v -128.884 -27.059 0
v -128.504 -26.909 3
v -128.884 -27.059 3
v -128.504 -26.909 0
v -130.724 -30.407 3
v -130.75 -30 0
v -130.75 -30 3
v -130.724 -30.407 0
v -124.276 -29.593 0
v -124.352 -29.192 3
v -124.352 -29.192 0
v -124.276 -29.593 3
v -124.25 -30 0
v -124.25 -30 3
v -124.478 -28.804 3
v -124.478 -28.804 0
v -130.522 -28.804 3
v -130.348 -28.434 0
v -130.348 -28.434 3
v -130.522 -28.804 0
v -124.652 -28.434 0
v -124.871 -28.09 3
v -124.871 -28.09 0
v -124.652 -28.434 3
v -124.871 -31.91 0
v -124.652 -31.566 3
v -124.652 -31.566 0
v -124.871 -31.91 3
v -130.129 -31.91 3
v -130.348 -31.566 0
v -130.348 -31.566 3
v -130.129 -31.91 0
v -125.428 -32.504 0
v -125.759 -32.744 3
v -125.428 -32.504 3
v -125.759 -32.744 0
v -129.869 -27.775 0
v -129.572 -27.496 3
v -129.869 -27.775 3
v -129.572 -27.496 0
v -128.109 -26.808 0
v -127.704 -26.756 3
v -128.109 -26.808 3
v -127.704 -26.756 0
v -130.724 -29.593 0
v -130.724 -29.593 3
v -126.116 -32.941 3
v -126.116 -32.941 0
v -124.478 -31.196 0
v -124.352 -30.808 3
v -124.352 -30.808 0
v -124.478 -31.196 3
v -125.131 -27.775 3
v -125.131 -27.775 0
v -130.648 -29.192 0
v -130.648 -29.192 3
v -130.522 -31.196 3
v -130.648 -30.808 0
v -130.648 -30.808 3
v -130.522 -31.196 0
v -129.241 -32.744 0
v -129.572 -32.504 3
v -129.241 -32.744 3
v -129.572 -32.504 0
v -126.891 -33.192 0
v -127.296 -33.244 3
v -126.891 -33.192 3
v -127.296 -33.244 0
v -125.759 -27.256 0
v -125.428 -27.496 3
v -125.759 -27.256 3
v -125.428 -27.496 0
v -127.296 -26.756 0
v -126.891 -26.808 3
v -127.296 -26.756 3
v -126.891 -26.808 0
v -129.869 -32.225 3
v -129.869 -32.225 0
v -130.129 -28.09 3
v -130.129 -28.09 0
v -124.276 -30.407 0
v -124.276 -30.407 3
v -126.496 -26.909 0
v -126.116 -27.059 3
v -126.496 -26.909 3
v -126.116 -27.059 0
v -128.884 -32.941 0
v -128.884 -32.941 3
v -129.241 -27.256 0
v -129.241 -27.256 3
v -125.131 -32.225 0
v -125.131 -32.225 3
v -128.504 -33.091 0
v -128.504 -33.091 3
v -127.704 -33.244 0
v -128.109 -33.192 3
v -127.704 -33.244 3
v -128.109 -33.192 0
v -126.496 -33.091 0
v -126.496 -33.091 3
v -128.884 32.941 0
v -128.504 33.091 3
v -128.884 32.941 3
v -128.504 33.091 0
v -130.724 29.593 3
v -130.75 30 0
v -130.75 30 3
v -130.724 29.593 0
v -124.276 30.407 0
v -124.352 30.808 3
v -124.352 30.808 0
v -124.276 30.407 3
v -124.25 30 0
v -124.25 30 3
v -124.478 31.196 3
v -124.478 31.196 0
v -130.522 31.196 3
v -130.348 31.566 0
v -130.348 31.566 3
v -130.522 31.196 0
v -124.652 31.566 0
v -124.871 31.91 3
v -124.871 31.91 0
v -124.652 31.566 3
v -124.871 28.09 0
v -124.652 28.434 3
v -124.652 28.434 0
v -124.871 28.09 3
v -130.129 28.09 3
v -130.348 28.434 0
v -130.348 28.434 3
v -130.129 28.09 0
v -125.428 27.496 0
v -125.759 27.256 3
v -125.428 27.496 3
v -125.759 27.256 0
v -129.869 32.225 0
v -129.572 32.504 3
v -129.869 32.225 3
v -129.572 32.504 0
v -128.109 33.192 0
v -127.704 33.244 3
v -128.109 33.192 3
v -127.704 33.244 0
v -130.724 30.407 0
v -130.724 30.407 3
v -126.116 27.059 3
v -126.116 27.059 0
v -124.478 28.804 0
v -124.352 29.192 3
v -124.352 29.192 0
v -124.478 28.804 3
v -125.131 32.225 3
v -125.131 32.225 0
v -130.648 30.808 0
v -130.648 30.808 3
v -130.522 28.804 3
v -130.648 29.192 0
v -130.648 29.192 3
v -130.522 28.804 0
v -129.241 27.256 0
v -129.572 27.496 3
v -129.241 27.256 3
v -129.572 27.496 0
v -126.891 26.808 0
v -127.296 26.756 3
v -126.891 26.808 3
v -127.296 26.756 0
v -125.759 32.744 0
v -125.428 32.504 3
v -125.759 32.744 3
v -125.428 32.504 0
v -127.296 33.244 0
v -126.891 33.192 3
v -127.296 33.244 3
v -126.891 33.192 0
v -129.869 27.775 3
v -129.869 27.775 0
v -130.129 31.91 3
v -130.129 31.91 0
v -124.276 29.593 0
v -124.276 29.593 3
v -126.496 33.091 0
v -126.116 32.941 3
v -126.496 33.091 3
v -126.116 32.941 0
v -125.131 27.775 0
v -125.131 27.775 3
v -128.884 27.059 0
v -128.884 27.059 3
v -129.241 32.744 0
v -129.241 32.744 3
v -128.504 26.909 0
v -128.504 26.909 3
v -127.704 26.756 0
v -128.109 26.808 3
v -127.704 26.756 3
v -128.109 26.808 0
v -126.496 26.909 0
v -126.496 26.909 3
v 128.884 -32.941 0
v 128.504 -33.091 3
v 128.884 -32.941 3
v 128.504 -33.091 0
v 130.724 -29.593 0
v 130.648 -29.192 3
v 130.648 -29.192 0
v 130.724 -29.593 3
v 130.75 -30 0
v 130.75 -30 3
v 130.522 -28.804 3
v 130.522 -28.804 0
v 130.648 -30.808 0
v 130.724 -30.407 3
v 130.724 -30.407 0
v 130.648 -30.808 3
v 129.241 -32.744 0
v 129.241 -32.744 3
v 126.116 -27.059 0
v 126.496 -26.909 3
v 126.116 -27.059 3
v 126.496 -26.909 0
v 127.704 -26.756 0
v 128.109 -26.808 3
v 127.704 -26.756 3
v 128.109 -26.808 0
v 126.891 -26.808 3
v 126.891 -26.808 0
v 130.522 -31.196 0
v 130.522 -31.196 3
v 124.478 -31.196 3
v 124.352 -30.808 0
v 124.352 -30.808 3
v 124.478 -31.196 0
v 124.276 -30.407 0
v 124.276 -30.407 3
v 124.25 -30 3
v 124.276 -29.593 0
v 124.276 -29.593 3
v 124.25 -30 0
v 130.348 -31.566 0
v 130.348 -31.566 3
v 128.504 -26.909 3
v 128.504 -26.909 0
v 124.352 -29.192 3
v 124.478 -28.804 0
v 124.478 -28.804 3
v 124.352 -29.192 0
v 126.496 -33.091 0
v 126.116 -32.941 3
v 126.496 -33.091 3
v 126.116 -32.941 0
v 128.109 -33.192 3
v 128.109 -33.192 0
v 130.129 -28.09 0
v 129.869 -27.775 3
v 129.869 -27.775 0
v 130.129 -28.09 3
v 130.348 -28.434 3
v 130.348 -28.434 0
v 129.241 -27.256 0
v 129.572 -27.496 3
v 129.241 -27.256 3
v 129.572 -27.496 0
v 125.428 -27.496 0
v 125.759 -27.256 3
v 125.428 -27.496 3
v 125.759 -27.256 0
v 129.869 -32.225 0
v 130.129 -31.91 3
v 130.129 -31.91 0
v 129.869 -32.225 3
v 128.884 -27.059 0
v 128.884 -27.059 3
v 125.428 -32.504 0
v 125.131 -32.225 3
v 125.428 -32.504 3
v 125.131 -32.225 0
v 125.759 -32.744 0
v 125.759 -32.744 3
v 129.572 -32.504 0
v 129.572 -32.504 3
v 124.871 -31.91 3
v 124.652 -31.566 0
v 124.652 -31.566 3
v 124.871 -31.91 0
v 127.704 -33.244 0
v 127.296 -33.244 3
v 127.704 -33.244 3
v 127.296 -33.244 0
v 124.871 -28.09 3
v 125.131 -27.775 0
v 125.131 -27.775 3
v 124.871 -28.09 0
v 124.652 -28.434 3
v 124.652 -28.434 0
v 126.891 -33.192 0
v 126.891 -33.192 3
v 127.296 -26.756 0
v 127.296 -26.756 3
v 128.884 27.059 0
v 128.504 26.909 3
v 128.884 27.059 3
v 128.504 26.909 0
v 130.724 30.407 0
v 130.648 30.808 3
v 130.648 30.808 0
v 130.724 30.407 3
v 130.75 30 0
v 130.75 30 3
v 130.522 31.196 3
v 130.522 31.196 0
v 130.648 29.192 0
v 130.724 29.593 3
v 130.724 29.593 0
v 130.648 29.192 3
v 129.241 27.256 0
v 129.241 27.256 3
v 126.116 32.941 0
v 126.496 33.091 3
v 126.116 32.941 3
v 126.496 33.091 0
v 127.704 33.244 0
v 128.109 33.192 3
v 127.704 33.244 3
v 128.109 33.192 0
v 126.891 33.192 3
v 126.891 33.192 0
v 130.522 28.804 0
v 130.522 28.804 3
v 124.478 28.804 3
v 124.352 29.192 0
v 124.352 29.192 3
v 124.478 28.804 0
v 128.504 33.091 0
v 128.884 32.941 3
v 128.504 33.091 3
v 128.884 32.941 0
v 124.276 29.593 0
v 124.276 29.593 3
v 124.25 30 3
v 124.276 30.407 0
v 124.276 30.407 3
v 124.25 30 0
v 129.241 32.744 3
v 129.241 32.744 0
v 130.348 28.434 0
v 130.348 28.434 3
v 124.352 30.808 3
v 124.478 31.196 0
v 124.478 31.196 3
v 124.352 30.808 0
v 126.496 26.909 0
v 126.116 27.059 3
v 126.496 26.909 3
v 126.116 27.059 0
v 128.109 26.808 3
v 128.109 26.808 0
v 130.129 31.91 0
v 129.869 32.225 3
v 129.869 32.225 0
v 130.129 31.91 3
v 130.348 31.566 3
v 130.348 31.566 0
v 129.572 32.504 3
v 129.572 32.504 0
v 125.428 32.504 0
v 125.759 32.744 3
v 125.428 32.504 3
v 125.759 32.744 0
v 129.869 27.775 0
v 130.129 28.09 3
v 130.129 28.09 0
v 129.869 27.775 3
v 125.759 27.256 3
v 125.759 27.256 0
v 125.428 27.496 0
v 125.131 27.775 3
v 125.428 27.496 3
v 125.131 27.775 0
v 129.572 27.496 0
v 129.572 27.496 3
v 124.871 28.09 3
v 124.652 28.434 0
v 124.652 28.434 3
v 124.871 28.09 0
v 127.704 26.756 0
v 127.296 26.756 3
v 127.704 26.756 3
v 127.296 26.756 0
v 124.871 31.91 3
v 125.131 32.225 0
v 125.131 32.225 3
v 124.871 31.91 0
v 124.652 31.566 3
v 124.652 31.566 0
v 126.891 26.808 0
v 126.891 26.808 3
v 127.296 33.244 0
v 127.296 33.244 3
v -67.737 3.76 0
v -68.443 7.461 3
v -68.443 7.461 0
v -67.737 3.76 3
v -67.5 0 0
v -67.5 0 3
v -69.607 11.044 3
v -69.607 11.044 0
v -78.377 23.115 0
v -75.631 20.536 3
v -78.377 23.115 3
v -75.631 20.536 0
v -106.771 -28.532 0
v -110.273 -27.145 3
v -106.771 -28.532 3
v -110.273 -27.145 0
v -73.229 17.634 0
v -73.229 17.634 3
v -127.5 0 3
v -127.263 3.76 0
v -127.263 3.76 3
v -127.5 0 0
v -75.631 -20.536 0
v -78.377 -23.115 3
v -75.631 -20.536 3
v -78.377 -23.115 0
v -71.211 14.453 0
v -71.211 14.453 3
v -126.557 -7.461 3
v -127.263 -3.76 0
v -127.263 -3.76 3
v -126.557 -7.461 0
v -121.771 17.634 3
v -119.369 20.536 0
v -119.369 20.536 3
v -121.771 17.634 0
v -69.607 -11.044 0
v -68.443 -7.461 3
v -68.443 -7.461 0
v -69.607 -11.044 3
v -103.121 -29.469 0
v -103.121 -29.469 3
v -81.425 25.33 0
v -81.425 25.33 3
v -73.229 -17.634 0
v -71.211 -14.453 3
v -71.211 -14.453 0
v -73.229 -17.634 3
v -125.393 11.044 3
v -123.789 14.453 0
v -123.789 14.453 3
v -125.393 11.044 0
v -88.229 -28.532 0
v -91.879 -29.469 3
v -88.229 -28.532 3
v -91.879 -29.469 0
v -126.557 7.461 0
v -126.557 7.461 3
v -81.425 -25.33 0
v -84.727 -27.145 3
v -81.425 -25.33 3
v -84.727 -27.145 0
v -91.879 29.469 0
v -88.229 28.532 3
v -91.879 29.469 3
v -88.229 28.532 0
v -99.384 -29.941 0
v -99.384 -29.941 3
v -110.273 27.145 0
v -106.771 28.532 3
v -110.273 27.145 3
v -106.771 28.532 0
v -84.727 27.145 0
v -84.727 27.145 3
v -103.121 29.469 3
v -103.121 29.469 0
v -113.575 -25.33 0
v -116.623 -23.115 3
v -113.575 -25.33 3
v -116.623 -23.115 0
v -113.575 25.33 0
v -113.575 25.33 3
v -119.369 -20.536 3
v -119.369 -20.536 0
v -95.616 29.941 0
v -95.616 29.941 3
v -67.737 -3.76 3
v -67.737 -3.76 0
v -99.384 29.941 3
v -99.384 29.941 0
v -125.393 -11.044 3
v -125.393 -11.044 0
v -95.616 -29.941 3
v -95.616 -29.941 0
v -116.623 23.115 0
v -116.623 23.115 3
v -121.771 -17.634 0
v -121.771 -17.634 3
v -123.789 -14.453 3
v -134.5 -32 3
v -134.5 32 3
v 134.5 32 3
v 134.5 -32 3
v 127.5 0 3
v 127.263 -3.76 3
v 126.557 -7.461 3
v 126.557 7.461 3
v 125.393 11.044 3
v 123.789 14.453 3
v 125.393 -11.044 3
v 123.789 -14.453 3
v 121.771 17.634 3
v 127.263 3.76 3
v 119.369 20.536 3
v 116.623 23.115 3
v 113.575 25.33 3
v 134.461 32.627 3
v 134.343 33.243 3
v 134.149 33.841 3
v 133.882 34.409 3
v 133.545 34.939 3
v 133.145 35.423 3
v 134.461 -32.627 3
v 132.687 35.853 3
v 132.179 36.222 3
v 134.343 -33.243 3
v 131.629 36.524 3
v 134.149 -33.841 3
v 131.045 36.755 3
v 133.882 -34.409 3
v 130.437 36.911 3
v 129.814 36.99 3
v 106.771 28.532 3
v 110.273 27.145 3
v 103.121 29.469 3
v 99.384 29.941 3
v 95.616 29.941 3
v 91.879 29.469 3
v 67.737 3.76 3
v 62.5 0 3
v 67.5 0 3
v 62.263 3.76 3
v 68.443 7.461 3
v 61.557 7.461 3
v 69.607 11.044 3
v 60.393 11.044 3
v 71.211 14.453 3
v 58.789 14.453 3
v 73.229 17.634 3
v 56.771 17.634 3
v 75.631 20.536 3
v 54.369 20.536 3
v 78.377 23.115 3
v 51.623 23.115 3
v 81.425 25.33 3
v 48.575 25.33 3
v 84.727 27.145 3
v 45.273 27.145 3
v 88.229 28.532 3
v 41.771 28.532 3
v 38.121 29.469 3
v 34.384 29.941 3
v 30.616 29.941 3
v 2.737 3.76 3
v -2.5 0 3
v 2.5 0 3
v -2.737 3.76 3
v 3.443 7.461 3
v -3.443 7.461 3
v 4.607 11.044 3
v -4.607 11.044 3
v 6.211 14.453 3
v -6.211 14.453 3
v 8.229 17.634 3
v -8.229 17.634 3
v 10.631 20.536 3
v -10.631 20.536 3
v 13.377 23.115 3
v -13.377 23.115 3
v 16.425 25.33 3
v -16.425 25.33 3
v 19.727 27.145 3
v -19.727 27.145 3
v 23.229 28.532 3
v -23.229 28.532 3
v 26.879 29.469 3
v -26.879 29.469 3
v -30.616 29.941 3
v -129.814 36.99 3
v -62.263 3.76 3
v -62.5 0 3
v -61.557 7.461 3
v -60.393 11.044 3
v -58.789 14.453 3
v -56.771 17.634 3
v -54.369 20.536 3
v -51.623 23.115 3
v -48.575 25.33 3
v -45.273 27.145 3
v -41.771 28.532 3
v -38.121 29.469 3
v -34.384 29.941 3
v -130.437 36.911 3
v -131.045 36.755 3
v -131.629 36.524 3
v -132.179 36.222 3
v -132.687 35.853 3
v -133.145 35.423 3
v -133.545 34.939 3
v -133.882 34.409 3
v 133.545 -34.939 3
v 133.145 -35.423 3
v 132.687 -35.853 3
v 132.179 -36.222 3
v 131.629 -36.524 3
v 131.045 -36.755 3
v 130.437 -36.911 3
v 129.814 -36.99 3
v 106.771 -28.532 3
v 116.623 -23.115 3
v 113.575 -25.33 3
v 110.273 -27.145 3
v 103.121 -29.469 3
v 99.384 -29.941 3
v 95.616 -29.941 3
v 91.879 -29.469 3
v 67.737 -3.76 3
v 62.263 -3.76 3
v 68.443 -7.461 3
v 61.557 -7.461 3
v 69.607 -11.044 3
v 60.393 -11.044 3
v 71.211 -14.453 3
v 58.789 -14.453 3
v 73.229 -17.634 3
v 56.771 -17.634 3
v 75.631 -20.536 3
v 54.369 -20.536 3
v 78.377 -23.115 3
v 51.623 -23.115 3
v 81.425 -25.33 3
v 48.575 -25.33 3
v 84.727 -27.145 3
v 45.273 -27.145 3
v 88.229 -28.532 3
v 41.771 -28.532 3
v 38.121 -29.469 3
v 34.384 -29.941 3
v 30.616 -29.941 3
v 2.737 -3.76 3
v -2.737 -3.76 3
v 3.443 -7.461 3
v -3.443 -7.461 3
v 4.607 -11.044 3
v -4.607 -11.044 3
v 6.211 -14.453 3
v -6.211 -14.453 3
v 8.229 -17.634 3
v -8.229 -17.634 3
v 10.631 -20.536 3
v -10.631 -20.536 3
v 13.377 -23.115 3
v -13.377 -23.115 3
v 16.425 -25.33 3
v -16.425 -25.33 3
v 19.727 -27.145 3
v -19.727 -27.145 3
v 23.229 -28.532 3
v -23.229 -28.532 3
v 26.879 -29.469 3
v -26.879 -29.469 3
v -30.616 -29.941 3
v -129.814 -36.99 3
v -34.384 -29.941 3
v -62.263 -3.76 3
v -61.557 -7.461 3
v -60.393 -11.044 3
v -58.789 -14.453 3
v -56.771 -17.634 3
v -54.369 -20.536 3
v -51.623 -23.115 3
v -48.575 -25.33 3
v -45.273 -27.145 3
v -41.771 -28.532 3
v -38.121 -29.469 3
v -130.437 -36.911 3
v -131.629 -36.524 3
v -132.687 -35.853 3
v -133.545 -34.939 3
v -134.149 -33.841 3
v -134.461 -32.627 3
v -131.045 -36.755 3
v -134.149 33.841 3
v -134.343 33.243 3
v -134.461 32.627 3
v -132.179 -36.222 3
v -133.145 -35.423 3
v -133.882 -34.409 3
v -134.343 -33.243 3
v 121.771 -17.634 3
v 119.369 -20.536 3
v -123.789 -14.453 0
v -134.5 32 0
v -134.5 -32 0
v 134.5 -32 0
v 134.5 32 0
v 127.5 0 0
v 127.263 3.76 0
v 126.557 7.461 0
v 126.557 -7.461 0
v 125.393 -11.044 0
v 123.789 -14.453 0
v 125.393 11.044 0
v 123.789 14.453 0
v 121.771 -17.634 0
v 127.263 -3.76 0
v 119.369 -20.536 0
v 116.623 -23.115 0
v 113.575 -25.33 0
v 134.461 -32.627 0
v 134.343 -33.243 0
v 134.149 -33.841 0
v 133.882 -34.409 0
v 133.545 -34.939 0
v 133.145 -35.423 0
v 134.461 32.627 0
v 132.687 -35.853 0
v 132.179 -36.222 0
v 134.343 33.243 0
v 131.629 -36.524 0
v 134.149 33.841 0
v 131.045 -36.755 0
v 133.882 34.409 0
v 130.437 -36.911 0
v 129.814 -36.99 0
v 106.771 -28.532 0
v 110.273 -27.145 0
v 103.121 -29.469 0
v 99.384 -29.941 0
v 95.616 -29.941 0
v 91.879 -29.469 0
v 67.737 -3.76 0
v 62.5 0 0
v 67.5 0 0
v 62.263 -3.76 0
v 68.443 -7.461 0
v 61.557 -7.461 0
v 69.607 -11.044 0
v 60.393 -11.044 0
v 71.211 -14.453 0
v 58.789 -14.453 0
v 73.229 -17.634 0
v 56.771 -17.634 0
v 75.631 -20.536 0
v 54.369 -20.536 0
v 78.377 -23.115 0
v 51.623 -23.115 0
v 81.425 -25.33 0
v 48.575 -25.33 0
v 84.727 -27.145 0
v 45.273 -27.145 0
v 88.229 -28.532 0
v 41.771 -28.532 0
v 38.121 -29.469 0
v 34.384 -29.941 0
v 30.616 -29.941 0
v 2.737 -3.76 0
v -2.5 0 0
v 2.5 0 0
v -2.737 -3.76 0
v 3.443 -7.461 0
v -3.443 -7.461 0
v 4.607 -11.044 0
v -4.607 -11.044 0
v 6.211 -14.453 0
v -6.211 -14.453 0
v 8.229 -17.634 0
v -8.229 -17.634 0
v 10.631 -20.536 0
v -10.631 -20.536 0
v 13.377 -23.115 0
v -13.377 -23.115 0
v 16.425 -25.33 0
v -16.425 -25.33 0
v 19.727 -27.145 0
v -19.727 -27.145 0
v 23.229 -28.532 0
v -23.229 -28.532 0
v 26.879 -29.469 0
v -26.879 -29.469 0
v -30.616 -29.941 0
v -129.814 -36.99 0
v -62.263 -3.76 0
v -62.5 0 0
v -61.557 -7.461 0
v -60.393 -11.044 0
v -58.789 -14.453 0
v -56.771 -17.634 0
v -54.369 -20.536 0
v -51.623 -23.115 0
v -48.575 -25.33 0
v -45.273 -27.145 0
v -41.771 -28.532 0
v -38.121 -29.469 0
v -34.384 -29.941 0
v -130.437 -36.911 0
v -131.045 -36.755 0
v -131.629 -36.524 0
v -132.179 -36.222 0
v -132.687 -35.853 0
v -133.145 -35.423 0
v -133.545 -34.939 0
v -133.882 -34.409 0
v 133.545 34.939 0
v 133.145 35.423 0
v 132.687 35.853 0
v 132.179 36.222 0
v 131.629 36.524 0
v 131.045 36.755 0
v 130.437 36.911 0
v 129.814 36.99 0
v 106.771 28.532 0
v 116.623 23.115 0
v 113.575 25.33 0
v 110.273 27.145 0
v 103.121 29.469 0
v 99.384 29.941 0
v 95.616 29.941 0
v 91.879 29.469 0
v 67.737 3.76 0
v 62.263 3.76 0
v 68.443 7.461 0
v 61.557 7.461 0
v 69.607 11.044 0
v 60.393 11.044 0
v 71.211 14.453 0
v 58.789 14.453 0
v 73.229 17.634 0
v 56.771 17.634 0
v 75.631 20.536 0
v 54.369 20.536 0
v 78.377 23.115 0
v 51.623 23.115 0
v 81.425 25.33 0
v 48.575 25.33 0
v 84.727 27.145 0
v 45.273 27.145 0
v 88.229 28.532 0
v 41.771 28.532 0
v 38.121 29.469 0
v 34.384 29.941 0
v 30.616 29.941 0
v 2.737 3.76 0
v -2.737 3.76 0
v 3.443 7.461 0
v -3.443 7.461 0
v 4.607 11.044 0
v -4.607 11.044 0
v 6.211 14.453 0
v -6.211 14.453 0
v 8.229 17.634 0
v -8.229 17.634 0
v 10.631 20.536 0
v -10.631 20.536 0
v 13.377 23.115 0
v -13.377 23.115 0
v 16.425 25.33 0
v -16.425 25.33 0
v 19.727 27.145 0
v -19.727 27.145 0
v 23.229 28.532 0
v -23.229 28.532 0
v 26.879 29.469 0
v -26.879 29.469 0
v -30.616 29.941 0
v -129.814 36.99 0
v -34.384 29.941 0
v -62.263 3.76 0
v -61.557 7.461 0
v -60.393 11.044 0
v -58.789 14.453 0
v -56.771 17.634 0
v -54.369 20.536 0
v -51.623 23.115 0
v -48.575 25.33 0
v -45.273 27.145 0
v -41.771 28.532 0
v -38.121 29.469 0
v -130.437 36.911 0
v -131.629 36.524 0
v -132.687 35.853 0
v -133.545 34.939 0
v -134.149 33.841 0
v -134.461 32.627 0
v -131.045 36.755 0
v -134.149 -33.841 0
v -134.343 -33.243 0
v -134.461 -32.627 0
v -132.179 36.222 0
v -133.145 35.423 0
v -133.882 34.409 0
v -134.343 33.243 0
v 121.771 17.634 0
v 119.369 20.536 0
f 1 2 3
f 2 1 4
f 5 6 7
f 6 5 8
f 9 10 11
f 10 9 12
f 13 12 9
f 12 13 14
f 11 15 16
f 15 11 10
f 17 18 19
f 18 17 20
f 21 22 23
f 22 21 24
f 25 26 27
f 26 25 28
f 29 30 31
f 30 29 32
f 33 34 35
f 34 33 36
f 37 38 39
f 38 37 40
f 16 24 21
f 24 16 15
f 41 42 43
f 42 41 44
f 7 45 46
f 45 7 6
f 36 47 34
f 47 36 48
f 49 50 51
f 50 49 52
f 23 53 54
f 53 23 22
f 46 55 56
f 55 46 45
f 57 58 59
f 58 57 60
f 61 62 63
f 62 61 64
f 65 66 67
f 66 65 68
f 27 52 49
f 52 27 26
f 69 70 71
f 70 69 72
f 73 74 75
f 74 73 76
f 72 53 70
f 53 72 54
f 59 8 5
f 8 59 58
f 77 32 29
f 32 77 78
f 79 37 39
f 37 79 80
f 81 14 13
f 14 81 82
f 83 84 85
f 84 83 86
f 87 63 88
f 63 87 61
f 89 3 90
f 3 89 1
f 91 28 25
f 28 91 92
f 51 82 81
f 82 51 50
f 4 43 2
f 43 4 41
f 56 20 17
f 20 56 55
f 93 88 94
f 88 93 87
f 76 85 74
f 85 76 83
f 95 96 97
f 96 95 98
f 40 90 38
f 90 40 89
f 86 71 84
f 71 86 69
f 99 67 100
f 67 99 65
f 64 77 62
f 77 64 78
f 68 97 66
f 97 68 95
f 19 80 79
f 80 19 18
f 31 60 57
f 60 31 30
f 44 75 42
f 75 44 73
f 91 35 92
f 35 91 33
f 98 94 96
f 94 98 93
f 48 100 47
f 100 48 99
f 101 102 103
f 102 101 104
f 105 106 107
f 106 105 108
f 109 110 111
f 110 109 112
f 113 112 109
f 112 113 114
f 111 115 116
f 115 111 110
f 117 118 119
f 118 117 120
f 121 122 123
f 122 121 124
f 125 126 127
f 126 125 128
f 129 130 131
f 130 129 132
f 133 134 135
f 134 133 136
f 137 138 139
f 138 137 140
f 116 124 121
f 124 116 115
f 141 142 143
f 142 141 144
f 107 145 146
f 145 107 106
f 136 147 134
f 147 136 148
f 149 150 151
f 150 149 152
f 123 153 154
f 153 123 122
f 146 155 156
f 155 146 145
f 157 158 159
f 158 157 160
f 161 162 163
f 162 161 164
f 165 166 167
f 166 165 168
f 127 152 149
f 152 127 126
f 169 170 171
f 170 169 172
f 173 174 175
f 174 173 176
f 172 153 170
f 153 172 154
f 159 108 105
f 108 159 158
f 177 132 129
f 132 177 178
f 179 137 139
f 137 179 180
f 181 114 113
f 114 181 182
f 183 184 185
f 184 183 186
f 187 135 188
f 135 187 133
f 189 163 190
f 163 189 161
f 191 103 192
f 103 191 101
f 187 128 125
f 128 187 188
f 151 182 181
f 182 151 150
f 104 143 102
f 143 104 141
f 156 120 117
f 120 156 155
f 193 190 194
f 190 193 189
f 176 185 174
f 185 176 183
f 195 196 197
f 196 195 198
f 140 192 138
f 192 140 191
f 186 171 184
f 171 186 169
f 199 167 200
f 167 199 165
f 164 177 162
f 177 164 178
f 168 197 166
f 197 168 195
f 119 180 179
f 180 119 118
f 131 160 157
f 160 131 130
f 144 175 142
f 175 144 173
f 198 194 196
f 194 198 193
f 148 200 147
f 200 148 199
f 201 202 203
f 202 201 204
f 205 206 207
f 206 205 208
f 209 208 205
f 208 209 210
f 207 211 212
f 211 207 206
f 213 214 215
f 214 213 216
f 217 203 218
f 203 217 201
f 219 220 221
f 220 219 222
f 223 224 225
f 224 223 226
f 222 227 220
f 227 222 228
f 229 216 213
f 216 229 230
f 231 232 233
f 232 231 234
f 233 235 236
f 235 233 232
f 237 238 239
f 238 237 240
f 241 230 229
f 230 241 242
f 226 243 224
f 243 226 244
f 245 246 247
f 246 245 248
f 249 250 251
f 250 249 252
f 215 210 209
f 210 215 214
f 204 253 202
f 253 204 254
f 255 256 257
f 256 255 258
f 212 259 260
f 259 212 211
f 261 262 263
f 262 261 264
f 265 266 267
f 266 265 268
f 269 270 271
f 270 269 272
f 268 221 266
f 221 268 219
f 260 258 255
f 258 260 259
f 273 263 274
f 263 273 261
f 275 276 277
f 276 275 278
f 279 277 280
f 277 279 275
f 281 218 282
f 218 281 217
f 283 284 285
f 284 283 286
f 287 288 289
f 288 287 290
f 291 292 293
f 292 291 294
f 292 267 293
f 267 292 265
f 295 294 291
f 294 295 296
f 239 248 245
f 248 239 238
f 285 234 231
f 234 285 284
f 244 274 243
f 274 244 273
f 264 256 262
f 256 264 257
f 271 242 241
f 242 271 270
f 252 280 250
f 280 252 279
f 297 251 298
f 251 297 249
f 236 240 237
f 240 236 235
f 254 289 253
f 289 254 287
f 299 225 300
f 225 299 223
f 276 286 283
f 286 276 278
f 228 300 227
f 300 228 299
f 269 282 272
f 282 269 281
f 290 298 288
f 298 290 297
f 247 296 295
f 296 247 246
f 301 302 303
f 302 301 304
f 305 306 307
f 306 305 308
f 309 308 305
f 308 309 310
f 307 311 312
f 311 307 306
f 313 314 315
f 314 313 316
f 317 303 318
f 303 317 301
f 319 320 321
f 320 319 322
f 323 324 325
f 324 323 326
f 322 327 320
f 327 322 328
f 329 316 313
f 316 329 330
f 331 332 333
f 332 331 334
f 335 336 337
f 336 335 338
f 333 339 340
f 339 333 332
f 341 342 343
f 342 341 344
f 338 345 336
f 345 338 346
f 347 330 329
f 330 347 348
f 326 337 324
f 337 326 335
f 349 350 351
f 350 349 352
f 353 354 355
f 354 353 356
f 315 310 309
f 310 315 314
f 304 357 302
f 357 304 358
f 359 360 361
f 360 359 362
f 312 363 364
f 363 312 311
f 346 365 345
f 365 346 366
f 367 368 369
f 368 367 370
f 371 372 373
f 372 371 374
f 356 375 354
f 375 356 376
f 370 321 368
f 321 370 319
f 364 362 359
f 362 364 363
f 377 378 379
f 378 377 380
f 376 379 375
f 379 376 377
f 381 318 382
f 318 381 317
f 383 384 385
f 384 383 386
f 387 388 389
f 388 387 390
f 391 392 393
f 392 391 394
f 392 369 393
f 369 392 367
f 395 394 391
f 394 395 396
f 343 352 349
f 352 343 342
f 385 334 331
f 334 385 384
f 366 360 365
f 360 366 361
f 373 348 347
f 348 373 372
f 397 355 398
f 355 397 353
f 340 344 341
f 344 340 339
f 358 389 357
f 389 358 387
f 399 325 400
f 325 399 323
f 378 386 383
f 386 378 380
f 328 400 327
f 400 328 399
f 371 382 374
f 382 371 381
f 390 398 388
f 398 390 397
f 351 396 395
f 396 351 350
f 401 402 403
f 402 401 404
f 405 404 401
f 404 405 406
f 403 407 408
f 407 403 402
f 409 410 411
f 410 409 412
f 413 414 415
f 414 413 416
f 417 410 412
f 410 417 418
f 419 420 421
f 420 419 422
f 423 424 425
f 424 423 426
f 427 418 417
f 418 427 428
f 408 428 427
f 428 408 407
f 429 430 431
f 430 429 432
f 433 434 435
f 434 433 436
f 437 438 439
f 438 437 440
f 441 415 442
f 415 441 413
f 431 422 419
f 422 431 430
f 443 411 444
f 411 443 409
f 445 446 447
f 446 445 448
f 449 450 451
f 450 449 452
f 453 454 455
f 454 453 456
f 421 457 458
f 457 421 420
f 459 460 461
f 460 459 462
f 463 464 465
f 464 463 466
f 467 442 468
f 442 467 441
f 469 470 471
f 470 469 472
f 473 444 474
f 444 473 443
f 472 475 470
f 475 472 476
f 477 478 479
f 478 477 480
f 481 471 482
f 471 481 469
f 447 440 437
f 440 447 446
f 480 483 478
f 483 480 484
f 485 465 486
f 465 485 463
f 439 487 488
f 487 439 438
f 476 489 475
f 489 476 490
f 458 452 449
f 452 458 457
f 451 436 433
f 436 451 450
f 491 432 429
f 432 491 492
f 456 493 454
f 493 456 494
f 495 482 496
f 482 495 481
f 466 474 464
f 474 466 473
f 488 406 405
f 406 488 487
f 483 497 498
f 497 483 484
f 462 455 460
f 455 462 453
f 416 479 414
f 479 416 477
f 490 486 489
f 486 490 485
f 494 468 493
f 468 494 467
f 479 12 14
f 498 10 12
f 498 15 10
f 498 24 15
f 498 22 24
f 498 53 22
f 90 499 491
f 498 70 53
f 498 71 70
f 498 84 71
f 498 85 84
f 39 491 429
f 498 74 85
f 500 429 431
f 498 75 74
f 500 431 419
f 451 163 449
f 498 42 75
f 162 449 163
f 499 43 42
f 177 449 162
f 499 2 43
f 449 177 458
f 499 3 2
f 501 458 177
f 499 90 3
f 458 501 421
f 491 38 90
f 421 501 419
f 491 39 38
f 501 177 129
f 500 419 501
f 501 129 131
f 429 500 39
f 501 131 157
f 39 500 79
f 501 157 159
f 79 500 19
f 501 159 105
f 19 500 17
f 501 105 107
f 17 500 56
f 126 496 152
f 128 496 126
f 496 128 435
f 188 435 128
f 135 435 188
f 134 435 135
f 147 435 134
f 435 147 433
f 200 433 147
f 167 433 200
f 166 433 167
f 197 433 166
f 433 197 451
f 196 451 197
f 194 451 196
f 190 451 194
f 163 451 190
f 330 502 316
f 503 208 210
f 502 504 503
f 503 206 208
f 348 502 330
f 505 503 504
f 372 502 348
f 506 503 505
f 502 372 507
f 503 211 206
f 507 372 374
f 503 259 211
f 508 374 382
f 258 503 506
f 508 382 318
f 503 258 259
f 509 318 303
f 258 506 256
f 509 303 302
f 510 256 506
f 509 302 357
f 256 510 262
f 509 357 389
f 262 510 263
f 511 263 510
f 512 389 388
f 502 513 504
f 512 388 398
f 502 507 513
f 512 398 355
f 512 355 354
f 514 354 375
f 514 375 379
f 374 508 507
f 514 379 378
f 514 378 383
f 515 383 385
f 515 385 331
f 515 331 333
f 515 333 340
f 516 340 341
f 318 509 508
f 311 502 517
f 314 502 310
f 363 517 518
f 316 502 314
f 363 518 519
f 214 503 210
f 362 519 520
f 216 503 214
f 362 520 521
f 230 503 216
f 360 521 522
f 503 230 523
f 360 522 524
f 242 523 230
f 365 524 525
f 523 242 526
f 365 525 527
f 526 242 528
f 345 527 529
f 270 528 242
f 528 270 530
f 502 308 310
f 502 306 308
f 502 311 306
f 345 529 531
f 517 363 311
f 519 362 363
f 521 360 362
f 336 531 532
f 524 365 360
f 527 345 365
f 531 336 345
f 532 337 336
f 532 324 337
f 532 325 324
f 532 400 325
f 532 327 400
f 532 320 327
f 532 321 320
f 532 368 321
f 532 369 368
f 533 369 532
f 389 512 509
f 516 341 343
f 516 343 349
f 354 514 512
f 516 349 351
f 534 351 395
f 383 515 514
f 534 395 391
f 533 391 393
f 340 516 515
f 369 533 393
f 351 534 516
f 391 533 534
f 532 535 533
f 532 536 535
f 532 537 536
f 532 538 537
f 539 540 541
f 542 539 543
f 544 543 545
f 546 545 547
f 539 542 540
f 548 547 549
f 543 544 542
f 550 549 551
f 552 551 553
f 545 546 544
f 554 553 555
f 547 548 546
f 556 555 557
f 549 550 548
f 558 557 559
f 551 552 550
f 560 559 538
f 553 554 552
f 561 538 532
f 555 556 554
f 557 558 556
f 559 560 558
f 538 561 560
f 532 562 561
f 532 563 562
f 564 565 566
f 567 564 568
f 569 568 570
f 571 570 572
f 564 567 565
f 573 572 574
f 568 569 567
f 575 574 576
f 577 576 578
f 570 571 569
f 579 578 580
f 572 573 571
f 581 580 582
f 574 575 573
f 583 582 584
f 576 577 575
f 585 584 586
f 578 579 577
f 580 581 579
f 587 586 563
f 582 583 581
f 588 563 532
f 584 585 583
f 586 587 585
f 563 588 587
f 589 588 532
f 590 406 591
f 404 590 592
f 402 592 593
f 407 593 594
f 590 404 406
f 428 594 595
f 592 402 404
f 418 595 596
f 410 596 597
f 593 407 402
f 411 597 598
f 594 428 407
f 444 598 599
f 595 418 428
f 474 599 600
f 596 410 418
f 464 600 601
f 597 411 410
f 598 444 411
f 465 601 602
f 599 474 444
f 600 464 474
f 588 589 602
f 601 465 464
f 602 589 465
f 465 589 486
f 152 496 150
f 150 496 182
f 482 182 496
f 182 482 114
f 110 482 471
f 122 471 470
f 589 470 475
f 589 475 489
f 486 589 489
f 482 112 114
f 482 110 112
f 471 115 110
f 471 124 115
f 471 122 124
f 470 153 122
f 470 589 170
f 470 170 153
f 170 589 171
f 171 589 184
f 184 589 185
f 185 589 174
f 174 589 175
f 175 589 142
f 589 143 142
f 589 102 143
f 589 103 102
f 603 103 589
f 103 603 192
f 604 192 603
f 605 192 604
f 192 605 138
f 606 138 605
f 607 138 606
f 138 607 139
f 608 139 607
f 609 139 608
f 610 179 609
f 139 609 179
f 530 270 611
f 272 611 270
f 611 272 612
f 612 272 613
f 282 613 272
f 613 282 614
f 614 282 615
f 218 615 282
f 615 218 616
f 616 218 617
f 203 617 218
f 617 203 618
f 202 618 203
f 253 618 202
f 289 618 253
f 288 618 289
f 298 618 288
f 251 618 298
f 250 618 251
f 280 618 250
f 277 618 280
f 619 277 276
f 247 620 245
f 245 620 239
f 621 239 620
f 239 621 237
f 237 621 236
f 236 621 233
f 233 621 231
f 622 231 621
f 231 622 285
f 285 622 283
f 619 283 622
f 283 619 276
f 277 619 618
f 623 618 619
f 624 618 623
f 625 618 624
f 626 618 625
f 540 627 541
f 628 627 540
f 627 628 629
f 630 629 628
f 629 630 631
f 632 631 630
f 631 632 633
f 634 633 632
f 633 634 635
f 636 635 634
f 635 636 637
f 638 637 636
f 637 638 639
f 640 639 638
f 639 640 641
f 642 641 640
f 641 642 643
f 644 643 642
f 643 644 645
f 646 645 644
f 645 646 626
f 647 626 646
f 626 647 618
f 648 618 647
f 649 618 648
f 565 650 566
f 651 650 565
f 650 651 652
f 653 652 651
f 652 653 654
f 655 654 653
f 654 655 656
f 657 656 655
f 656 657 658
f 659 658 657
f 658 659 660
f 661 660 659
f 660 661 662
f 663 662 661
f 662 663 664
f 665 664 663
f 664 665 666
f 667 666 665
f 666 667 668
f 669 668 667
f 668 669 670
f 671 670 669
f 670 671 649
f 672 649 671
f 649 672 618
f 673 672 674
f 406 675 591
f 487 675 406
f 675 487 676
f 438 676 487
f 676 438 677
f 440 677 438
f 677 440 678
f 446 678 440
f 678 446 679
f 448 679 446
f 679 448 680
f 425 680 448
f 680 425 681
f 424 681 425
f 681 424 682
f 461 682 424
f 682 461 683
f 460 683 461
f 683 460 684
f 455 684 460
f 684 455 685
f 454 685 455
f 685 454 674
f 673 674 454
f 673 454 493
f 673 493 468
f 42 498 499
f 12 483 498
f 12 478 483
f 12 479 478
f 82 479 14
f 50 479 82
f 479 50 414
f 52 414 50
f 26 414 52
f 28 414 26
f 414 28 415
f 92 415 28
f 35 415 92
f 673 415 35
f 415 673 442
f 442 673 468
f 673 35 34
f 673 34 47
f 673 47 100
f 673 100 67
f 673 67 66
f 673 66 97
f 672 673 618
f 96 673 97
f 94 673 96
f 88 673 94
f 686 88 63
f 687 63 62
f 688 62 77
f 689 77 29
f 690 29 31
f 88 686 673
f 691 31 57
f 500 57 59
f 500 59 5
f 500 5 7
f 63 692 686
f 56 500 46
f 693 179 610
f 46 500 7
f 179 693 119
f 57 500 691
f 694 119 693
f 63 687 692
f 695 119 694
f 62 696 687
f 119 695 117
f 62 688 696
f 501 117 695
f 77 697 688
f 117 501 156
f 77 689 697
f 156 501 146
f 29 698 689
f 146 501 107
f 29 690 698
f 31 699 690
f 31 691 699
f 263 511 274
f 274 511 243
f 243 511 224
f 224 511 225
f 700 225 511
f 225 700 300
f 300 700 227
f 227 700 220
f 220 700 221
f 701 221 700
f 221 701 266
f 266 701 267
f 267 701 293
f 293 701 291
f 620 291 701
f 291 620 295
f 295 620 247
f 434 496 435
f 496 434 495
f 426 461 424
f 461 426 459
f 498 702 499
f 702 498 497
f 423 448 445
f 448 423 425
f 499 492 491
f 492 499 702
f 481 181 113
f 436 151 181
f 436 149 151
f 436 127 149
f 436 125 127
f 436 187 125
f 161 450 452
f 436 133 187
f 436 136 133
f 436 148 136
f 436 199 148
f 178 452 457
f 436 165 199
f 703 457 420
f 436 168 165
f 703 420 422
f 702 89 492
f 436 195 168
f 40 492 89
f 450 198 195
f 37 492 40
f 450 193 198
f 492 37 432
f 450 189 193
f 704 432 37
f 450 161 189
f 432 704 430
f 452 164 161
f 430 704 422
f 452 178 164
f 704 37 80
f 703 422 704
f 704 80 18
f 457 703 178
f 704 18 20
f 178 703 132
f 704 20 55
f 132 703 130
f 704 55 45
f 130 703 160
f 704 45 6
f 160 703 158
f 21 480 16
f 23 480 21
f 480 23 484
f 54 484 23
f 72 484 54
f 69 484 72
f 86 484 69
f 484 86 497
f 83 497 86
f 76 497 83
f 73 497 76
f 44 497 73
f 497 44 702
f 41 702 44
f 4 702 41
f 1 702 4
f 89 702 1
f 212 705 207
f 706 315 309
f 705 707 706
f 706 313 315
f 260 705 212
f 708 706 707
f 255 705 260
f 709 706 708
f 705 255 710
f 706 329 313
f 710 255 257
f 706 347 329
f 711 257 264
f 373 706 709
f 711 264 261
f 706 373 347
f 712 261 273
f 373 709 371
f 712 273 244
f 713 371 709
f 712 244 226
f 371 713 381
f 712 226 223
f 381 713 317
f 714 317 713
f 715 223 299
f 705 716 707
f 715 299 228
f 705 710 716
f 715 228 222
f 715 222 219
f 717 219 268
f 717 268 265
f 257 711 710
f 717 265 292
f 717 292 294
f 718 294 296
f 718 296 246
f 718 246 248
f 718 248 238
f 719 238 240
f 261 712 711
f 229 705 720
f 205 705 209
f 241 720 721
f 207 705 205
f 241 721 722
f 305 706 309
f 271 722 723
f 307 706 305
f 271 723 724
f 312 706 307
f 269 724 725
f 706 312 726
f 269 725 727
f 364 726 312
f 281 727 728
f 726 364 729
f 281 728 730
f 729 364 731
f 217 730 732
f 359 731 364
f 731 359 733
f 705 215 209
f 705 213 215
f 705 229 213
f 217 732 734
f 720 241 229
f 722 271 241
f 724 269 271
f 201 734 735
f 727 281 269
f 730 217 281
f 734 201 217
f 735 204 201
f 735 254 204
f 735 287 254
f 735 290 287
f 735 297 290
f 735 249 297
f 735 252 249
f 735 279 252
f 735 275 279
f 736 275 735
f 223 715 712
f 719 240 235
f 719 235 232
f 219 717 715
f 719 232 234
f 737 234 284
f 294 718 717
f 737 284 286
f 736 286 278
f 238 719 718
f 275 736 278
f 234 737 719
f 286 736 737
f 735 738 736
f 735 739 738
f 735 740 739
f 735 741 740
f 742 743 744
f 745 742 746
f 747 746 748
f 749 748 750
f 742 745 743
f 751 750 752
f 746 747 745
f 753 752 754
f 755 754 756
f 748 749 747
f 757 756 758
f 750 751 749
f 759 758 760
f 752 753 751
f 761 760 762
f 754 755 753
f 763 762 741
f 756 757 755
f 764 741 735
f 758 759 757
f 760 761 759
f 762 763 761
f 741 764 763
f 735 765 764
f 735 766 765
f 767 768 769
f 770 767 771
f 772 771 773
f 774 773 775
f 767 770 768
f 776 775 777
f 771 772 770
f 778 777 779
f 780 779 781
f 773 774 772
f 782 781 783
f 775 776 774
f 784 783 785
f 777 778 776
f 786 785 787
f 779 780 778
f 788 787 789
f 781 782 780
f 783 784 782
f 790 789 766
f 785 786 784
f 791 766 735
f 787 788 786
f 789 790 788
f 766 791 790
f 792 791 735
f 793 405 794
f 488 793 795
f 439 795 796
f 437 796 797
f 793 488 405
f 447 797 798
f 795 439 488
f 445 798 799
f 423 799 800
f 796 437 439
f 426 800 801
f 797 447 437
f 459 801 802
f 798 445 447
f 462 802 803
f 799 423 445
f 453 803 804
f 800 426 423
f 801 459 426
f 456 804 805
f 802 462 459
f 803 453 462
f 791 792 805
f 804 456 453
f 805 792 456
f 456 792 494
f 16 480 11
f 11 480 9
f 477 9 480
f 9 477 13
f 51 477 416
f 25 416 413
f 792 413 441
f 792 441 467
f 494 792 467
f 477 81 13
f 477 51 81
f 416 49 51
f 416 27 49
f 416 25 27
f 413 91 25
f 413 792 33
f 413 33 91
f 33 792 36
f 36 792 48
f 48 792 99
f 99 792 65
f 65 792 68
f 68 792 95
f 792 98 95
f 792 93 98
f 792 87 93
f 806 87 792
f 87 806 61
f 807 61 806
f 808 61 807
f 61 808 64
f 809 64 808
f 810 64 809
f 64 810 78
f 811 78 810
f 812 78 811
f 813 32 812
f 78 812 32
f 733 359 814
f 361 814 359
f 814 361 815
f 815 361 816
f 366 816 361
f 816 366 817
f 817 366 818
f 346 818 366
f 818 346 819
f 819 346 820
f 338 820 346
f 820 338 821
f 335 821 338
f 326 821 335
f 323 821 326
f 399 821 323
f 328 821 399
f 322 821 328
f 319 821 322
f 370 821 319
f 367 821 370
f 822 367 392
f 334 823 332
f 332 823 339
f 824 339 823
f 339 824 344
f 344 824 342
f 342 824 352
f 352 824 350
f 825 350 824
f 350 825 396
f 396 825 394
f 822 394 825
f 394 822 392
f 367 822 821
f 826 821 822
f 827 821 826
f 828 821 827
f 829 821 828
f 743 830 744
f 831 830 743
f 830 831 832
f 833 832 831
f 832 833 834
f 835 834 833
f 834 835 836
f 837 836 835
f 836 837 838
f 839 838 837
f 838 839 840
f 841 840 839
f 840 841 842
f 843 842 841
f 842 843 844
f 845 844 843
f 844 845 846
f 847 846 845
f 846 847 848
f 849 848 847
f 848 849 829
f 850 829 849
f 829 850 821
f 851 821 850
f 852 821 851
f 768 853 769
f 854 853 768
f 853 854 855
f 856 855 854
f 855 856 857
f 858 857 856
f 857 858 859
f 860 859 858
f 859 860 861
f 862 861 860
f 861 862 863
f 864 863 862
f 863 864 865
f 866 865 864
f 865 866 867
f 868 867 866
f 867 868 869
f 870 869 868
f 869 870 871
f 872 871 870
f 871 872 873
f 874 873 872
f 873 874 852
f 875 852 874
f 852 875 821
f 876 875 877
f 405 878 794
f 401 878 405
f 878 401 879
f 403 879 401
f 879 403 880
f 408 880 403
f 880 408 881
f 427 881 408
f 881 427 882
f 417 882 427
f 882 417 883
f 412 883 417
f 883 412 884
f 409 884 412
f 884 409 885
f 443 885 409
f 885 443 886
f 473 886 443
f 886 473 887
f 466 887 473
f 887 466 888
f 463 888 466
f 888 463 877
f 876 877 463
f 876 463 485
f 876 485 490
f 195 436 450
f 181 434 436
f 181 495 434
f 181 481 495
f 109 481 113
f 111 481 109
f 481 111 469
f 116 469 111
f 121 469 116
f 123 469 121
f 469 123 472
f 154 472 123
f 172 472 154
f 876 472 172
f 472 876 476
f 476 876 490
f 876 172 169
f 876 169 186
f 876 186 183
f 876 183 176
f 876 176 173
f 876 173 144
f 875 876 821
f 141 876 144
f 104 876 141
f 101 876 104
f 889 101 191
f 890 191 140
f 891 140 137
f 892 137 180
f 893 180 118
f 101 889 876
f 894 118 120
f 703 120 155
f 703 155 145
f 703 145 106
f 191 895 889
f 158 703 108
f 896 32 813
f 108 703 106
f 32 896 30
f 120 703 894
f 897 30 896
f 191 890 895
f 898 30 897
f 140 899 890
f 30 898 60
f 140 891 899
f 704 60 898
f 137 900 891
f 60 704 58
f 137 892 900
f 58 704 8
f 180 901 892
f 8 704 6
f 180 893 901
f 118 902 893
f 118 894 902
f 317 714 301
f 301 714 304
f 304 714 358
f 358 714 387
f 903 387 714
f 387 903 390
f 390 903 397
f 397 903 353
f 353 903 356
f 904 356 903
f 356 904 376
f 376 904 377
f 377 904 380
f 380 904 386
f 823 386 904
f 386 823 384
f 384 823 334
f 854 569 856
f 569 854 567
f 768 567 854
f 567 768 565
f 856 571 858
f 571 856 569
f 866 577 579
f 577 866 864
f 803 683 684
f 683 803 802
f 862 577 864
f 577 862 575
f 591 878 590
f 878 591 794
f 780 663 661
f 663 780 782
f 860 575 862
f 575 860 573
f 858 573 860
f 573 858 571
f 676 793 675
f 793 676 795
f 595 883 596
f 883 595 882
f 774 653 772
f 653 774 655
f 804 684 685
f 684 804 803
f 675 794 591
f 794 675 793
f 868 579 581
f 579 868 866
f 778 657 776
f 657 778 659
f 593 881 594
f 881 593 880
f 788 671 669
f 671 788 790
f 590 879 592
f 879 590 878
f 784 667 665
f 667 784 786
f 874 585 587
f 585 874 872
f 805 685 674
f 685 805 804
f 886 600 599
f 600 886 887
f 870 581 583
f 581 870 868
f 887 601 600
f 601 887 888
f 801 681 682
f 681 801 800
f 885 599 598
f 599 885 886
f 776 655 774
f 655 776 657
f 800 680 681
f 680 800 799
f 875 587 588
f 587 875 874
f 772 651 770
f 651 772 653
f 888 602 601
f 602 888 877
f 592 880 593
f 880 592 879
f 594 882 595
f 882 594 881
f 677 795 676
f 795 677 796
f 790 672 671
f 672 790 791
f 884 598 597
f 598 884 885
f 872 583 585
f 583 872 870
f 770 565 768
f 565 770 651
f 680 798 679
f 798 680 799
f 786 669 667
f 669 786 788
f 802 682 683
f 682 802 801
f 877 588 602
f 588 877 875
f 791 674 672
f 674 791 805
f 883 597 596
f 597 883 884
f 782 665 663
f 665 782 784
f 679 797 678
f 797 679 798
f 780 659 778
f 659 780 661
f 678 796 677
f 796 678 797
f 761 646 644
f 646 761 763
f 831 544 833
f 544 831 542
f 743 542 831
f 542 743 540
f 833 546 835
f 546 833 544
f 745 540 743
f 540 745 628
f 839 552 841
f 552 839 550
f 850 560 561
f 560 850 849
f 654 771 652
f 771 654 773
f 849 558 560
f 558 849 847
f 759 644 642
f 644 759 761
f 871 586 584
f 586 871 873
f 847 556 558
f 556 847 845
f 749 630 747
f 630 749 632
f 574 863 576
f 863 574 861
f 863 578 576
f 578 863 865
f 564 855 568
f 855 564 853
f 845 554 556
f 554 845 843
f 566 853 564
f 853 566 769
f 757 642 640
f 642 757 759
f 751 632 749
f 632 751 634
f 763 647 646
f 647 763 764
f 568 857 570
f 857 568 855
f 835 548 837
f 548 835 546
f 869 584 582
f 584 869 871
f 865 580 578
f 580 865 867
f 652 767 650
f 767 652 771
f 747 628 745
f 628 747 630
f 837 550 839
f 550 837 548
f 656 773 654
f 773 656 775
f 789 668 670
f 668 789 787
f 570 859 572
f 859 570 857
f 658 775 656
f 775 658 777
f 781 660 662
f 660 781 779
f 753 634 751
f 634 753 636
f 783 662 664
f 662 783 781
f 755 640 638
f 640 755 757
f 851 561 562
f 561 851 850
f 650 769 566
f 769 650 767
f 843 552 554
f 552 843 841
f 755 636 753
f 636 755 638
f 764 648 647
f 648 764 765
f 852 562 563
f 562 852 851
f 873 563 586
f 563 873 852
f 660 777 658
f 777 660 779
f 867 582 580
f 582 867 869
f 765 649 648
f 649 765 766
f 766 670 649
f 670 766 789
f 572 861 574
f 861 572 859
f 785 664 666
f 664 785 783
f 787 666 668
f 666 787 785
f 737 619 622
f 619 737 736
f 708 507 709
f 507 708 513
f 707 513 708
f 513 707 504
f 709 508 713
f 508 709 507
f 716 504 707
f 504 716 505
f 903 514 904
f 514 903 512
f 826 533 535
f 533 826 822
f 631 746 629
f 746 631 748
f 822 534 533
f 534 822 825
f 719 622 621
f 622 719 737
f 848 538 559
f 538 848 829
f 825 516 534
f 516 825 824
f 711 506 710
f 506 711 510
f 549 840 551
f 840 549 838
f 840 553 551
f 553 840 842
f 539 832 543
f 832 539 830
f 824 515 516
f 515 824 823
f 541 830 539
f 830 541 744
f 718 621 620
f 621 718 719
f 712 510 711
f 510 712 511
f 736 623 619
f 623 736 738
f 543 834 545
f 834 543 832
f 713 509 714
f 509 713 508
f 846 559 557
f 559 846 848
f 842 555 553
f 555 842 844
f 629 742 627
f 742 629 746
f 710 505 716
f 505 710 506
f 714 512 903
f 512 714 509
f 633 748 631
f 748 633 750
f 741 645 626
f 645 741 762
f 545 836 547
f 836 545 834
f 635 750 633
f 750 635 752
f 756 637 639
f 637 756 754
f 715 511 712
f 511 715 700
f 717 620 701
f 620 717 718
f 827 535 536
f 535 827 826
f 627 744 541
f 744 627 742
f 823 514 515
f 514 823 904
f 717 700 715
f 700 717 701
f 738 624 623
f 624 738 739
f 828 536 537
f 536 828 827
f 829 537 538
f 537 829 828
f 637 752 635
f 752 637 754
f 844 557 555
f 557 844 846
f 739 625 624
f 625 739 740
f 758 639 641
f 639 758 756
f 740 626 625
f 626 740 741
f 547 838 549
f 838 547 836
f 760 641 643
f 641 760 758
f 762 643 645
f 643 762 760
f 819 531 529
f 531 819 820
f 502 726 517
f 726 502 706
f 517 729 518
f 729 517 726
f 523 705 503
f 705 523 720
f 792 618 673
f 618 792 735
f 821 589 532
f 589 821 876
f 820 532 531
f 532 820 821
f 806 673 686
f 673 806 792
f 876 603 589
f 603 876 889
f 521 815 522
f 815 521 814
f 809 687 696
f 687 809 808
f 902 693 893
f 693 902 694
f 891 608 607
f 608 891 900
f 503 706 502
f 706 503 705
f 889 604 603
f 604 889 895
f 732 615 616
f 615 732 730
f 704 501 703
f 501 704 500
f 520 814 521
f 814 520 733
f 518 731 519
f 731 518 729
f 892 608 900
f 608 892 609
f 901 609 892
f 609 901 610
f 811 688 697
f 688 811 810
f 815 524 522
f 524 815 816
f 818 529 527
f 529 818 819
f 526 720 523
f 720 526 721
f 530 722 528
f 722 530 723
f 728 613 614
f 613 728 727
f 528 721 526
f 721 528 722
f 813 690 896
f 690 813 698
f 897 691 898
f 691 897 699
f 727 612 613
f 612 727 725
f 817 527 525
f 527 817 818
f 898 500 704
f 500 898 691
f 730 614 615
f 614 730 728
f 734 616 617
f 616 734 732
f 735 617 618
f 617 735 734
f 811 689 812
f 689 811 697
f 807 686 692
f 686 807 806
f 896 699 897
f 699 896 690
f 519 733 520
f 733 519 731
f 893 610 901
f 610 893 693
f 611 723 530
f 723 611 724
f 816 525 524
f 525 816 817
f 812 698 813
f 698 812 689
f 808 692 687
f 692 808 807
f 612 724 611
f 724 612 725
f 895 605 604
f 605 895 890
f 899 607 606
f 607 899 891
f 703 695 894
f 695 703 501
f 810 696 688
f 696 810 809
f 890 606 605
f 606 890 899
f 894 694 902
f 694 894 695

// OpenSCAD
$fn = 50;

difference() {
	union() {
		hull() {
			translate(v = [-129.5, 32.0, 0]) {
				cylinder(h = 3, r = 5);
			}
			translate(v = [129.5, 32.0, 0]) {
				cylinder(h = 3, r = 5);
			}
			translate(v = [-129.5, -32.0, 0]) {
				cylinder(h = 3, r = 5);
			}
			translate(v = [129.5, -32.0, 0]) {
				cylinder(h = 3, r = 5);
			}
		}
	}
	union() {
		translate(v = [-127.5, -30.0, -100.0]) {
			cylinder(h = 200, r = 3.25);
		}
		translate(v = [-127.5, 30.0, -100.0]) {
			cylinder(h = 200, r = 3.25);
		}
		translate(v = [127.5, -30.0, -100.0]) {
			cylinder(h = 200, r = 3.25);
		}
		translate(v = [127.5, 30.0, -100.0]) {
			cylinder(h = 200, r = 3.25);
		}
		translate(v = [-127.5, -30.0, -100.0]) {
			cylinder(h = 200, r = 1.8);
		}
		translate(v = [-127.5, 30.0, -100.0]) {
			cylinder(h = 200, r = 1.8);
		}
		translate(v = [127.5, -30.0, -100.0]) {
			cylinder(h = 200, r = 1.8);
		}
		translate(v = [127.5, 30.0, -100.0]) {
			cylinder(h = 200, r = 1.8);
		}
		translate(v = [-97.5, 0, 0.0]) {
			cylinder(h = 3, r = 30.0);
		}
		translate(v = [-32.5, 0, 0.0]) {
			cylinder(h = 3, r = 30.0);
		}
		translate(v = [32.5, 0, 0.0]) {
			cylinder(h = 3, r = 30.0);
		}
		translate(v = [97.5, 0, 0.0]) {
			cylinder(h = 3, r = 30.0);
		}
	}
}
